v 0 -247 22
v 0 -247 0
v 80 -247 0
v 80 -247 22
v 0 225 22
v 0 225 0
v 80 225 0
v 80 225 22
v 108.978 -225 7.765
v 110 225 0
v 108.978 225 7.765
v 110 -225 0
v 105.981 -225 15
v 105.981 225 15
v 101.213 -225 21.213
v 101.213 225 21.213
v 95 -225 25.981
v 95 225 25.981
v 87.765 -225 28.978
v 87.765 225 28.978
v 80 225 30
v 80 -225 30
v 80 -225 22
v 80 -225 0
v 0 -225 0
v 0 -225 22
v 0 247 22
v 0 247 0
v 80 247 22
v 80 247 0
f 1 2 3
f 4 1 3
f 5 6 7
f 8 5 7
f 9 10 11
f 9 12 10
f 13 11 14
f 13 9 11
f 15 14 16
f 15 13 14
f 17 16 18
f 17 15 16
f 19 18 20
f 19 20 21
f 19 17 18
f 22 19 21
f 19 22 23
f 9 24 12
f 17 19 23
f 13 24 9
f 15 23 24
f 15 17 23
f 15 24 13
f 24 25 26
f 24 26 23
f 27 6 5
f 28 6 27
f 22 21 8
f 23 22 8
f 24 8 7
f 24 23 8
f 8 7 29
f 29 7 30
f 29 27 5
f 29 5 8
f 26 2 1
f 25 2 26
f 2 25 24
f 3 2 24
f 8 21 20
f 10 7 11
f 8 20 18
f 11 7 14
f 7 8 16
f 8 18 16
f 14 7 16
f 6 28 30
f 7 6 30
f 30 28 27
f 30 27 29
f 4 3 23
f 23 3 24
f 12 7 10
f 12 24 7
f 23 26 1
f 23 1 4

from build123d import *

# Parameters (mm, degrees)
SKETCH002_W    = 80
SKETCH002_H    = 22
PAD001_DEPTH   = 22
PAD_DEPTH      = 225
PAD_DEPTH_BACK = 225


with BuildPart() as pad001:
    # Sketch002 → Pad001 (new body)
    with BuildSketch(Plane.XY):
        with Locations((40, 236)):
            Rectangle(SKETCH002_W, SKETCH002_H)
        with Locations((40, -236)):
            Rectangle(SKETCH002_W, SKETCH002_H)
    extrude(amount=PAD001_DEPTH)


with BuildPart() as fusion:
    # Sketch → Pad (new body, two sides)
    with BuildSketch(Plane.XZ) as pad_sk:
        with BuildLine():
            ThreePointArc((110, 0), (101.213203, 21.213203), (80, 30))
            Line((80, 30), (80, 0))
            Line((80, 0), (110, 0))
        make_face()
    extrude(amount=PAD_DEPTH)
    extrude(pad_sk.sketch, amount=-PAD_DEPTH_BACK)

    # Fusion: union Pad001
    add(pad001.part)


solid = fusion.part
